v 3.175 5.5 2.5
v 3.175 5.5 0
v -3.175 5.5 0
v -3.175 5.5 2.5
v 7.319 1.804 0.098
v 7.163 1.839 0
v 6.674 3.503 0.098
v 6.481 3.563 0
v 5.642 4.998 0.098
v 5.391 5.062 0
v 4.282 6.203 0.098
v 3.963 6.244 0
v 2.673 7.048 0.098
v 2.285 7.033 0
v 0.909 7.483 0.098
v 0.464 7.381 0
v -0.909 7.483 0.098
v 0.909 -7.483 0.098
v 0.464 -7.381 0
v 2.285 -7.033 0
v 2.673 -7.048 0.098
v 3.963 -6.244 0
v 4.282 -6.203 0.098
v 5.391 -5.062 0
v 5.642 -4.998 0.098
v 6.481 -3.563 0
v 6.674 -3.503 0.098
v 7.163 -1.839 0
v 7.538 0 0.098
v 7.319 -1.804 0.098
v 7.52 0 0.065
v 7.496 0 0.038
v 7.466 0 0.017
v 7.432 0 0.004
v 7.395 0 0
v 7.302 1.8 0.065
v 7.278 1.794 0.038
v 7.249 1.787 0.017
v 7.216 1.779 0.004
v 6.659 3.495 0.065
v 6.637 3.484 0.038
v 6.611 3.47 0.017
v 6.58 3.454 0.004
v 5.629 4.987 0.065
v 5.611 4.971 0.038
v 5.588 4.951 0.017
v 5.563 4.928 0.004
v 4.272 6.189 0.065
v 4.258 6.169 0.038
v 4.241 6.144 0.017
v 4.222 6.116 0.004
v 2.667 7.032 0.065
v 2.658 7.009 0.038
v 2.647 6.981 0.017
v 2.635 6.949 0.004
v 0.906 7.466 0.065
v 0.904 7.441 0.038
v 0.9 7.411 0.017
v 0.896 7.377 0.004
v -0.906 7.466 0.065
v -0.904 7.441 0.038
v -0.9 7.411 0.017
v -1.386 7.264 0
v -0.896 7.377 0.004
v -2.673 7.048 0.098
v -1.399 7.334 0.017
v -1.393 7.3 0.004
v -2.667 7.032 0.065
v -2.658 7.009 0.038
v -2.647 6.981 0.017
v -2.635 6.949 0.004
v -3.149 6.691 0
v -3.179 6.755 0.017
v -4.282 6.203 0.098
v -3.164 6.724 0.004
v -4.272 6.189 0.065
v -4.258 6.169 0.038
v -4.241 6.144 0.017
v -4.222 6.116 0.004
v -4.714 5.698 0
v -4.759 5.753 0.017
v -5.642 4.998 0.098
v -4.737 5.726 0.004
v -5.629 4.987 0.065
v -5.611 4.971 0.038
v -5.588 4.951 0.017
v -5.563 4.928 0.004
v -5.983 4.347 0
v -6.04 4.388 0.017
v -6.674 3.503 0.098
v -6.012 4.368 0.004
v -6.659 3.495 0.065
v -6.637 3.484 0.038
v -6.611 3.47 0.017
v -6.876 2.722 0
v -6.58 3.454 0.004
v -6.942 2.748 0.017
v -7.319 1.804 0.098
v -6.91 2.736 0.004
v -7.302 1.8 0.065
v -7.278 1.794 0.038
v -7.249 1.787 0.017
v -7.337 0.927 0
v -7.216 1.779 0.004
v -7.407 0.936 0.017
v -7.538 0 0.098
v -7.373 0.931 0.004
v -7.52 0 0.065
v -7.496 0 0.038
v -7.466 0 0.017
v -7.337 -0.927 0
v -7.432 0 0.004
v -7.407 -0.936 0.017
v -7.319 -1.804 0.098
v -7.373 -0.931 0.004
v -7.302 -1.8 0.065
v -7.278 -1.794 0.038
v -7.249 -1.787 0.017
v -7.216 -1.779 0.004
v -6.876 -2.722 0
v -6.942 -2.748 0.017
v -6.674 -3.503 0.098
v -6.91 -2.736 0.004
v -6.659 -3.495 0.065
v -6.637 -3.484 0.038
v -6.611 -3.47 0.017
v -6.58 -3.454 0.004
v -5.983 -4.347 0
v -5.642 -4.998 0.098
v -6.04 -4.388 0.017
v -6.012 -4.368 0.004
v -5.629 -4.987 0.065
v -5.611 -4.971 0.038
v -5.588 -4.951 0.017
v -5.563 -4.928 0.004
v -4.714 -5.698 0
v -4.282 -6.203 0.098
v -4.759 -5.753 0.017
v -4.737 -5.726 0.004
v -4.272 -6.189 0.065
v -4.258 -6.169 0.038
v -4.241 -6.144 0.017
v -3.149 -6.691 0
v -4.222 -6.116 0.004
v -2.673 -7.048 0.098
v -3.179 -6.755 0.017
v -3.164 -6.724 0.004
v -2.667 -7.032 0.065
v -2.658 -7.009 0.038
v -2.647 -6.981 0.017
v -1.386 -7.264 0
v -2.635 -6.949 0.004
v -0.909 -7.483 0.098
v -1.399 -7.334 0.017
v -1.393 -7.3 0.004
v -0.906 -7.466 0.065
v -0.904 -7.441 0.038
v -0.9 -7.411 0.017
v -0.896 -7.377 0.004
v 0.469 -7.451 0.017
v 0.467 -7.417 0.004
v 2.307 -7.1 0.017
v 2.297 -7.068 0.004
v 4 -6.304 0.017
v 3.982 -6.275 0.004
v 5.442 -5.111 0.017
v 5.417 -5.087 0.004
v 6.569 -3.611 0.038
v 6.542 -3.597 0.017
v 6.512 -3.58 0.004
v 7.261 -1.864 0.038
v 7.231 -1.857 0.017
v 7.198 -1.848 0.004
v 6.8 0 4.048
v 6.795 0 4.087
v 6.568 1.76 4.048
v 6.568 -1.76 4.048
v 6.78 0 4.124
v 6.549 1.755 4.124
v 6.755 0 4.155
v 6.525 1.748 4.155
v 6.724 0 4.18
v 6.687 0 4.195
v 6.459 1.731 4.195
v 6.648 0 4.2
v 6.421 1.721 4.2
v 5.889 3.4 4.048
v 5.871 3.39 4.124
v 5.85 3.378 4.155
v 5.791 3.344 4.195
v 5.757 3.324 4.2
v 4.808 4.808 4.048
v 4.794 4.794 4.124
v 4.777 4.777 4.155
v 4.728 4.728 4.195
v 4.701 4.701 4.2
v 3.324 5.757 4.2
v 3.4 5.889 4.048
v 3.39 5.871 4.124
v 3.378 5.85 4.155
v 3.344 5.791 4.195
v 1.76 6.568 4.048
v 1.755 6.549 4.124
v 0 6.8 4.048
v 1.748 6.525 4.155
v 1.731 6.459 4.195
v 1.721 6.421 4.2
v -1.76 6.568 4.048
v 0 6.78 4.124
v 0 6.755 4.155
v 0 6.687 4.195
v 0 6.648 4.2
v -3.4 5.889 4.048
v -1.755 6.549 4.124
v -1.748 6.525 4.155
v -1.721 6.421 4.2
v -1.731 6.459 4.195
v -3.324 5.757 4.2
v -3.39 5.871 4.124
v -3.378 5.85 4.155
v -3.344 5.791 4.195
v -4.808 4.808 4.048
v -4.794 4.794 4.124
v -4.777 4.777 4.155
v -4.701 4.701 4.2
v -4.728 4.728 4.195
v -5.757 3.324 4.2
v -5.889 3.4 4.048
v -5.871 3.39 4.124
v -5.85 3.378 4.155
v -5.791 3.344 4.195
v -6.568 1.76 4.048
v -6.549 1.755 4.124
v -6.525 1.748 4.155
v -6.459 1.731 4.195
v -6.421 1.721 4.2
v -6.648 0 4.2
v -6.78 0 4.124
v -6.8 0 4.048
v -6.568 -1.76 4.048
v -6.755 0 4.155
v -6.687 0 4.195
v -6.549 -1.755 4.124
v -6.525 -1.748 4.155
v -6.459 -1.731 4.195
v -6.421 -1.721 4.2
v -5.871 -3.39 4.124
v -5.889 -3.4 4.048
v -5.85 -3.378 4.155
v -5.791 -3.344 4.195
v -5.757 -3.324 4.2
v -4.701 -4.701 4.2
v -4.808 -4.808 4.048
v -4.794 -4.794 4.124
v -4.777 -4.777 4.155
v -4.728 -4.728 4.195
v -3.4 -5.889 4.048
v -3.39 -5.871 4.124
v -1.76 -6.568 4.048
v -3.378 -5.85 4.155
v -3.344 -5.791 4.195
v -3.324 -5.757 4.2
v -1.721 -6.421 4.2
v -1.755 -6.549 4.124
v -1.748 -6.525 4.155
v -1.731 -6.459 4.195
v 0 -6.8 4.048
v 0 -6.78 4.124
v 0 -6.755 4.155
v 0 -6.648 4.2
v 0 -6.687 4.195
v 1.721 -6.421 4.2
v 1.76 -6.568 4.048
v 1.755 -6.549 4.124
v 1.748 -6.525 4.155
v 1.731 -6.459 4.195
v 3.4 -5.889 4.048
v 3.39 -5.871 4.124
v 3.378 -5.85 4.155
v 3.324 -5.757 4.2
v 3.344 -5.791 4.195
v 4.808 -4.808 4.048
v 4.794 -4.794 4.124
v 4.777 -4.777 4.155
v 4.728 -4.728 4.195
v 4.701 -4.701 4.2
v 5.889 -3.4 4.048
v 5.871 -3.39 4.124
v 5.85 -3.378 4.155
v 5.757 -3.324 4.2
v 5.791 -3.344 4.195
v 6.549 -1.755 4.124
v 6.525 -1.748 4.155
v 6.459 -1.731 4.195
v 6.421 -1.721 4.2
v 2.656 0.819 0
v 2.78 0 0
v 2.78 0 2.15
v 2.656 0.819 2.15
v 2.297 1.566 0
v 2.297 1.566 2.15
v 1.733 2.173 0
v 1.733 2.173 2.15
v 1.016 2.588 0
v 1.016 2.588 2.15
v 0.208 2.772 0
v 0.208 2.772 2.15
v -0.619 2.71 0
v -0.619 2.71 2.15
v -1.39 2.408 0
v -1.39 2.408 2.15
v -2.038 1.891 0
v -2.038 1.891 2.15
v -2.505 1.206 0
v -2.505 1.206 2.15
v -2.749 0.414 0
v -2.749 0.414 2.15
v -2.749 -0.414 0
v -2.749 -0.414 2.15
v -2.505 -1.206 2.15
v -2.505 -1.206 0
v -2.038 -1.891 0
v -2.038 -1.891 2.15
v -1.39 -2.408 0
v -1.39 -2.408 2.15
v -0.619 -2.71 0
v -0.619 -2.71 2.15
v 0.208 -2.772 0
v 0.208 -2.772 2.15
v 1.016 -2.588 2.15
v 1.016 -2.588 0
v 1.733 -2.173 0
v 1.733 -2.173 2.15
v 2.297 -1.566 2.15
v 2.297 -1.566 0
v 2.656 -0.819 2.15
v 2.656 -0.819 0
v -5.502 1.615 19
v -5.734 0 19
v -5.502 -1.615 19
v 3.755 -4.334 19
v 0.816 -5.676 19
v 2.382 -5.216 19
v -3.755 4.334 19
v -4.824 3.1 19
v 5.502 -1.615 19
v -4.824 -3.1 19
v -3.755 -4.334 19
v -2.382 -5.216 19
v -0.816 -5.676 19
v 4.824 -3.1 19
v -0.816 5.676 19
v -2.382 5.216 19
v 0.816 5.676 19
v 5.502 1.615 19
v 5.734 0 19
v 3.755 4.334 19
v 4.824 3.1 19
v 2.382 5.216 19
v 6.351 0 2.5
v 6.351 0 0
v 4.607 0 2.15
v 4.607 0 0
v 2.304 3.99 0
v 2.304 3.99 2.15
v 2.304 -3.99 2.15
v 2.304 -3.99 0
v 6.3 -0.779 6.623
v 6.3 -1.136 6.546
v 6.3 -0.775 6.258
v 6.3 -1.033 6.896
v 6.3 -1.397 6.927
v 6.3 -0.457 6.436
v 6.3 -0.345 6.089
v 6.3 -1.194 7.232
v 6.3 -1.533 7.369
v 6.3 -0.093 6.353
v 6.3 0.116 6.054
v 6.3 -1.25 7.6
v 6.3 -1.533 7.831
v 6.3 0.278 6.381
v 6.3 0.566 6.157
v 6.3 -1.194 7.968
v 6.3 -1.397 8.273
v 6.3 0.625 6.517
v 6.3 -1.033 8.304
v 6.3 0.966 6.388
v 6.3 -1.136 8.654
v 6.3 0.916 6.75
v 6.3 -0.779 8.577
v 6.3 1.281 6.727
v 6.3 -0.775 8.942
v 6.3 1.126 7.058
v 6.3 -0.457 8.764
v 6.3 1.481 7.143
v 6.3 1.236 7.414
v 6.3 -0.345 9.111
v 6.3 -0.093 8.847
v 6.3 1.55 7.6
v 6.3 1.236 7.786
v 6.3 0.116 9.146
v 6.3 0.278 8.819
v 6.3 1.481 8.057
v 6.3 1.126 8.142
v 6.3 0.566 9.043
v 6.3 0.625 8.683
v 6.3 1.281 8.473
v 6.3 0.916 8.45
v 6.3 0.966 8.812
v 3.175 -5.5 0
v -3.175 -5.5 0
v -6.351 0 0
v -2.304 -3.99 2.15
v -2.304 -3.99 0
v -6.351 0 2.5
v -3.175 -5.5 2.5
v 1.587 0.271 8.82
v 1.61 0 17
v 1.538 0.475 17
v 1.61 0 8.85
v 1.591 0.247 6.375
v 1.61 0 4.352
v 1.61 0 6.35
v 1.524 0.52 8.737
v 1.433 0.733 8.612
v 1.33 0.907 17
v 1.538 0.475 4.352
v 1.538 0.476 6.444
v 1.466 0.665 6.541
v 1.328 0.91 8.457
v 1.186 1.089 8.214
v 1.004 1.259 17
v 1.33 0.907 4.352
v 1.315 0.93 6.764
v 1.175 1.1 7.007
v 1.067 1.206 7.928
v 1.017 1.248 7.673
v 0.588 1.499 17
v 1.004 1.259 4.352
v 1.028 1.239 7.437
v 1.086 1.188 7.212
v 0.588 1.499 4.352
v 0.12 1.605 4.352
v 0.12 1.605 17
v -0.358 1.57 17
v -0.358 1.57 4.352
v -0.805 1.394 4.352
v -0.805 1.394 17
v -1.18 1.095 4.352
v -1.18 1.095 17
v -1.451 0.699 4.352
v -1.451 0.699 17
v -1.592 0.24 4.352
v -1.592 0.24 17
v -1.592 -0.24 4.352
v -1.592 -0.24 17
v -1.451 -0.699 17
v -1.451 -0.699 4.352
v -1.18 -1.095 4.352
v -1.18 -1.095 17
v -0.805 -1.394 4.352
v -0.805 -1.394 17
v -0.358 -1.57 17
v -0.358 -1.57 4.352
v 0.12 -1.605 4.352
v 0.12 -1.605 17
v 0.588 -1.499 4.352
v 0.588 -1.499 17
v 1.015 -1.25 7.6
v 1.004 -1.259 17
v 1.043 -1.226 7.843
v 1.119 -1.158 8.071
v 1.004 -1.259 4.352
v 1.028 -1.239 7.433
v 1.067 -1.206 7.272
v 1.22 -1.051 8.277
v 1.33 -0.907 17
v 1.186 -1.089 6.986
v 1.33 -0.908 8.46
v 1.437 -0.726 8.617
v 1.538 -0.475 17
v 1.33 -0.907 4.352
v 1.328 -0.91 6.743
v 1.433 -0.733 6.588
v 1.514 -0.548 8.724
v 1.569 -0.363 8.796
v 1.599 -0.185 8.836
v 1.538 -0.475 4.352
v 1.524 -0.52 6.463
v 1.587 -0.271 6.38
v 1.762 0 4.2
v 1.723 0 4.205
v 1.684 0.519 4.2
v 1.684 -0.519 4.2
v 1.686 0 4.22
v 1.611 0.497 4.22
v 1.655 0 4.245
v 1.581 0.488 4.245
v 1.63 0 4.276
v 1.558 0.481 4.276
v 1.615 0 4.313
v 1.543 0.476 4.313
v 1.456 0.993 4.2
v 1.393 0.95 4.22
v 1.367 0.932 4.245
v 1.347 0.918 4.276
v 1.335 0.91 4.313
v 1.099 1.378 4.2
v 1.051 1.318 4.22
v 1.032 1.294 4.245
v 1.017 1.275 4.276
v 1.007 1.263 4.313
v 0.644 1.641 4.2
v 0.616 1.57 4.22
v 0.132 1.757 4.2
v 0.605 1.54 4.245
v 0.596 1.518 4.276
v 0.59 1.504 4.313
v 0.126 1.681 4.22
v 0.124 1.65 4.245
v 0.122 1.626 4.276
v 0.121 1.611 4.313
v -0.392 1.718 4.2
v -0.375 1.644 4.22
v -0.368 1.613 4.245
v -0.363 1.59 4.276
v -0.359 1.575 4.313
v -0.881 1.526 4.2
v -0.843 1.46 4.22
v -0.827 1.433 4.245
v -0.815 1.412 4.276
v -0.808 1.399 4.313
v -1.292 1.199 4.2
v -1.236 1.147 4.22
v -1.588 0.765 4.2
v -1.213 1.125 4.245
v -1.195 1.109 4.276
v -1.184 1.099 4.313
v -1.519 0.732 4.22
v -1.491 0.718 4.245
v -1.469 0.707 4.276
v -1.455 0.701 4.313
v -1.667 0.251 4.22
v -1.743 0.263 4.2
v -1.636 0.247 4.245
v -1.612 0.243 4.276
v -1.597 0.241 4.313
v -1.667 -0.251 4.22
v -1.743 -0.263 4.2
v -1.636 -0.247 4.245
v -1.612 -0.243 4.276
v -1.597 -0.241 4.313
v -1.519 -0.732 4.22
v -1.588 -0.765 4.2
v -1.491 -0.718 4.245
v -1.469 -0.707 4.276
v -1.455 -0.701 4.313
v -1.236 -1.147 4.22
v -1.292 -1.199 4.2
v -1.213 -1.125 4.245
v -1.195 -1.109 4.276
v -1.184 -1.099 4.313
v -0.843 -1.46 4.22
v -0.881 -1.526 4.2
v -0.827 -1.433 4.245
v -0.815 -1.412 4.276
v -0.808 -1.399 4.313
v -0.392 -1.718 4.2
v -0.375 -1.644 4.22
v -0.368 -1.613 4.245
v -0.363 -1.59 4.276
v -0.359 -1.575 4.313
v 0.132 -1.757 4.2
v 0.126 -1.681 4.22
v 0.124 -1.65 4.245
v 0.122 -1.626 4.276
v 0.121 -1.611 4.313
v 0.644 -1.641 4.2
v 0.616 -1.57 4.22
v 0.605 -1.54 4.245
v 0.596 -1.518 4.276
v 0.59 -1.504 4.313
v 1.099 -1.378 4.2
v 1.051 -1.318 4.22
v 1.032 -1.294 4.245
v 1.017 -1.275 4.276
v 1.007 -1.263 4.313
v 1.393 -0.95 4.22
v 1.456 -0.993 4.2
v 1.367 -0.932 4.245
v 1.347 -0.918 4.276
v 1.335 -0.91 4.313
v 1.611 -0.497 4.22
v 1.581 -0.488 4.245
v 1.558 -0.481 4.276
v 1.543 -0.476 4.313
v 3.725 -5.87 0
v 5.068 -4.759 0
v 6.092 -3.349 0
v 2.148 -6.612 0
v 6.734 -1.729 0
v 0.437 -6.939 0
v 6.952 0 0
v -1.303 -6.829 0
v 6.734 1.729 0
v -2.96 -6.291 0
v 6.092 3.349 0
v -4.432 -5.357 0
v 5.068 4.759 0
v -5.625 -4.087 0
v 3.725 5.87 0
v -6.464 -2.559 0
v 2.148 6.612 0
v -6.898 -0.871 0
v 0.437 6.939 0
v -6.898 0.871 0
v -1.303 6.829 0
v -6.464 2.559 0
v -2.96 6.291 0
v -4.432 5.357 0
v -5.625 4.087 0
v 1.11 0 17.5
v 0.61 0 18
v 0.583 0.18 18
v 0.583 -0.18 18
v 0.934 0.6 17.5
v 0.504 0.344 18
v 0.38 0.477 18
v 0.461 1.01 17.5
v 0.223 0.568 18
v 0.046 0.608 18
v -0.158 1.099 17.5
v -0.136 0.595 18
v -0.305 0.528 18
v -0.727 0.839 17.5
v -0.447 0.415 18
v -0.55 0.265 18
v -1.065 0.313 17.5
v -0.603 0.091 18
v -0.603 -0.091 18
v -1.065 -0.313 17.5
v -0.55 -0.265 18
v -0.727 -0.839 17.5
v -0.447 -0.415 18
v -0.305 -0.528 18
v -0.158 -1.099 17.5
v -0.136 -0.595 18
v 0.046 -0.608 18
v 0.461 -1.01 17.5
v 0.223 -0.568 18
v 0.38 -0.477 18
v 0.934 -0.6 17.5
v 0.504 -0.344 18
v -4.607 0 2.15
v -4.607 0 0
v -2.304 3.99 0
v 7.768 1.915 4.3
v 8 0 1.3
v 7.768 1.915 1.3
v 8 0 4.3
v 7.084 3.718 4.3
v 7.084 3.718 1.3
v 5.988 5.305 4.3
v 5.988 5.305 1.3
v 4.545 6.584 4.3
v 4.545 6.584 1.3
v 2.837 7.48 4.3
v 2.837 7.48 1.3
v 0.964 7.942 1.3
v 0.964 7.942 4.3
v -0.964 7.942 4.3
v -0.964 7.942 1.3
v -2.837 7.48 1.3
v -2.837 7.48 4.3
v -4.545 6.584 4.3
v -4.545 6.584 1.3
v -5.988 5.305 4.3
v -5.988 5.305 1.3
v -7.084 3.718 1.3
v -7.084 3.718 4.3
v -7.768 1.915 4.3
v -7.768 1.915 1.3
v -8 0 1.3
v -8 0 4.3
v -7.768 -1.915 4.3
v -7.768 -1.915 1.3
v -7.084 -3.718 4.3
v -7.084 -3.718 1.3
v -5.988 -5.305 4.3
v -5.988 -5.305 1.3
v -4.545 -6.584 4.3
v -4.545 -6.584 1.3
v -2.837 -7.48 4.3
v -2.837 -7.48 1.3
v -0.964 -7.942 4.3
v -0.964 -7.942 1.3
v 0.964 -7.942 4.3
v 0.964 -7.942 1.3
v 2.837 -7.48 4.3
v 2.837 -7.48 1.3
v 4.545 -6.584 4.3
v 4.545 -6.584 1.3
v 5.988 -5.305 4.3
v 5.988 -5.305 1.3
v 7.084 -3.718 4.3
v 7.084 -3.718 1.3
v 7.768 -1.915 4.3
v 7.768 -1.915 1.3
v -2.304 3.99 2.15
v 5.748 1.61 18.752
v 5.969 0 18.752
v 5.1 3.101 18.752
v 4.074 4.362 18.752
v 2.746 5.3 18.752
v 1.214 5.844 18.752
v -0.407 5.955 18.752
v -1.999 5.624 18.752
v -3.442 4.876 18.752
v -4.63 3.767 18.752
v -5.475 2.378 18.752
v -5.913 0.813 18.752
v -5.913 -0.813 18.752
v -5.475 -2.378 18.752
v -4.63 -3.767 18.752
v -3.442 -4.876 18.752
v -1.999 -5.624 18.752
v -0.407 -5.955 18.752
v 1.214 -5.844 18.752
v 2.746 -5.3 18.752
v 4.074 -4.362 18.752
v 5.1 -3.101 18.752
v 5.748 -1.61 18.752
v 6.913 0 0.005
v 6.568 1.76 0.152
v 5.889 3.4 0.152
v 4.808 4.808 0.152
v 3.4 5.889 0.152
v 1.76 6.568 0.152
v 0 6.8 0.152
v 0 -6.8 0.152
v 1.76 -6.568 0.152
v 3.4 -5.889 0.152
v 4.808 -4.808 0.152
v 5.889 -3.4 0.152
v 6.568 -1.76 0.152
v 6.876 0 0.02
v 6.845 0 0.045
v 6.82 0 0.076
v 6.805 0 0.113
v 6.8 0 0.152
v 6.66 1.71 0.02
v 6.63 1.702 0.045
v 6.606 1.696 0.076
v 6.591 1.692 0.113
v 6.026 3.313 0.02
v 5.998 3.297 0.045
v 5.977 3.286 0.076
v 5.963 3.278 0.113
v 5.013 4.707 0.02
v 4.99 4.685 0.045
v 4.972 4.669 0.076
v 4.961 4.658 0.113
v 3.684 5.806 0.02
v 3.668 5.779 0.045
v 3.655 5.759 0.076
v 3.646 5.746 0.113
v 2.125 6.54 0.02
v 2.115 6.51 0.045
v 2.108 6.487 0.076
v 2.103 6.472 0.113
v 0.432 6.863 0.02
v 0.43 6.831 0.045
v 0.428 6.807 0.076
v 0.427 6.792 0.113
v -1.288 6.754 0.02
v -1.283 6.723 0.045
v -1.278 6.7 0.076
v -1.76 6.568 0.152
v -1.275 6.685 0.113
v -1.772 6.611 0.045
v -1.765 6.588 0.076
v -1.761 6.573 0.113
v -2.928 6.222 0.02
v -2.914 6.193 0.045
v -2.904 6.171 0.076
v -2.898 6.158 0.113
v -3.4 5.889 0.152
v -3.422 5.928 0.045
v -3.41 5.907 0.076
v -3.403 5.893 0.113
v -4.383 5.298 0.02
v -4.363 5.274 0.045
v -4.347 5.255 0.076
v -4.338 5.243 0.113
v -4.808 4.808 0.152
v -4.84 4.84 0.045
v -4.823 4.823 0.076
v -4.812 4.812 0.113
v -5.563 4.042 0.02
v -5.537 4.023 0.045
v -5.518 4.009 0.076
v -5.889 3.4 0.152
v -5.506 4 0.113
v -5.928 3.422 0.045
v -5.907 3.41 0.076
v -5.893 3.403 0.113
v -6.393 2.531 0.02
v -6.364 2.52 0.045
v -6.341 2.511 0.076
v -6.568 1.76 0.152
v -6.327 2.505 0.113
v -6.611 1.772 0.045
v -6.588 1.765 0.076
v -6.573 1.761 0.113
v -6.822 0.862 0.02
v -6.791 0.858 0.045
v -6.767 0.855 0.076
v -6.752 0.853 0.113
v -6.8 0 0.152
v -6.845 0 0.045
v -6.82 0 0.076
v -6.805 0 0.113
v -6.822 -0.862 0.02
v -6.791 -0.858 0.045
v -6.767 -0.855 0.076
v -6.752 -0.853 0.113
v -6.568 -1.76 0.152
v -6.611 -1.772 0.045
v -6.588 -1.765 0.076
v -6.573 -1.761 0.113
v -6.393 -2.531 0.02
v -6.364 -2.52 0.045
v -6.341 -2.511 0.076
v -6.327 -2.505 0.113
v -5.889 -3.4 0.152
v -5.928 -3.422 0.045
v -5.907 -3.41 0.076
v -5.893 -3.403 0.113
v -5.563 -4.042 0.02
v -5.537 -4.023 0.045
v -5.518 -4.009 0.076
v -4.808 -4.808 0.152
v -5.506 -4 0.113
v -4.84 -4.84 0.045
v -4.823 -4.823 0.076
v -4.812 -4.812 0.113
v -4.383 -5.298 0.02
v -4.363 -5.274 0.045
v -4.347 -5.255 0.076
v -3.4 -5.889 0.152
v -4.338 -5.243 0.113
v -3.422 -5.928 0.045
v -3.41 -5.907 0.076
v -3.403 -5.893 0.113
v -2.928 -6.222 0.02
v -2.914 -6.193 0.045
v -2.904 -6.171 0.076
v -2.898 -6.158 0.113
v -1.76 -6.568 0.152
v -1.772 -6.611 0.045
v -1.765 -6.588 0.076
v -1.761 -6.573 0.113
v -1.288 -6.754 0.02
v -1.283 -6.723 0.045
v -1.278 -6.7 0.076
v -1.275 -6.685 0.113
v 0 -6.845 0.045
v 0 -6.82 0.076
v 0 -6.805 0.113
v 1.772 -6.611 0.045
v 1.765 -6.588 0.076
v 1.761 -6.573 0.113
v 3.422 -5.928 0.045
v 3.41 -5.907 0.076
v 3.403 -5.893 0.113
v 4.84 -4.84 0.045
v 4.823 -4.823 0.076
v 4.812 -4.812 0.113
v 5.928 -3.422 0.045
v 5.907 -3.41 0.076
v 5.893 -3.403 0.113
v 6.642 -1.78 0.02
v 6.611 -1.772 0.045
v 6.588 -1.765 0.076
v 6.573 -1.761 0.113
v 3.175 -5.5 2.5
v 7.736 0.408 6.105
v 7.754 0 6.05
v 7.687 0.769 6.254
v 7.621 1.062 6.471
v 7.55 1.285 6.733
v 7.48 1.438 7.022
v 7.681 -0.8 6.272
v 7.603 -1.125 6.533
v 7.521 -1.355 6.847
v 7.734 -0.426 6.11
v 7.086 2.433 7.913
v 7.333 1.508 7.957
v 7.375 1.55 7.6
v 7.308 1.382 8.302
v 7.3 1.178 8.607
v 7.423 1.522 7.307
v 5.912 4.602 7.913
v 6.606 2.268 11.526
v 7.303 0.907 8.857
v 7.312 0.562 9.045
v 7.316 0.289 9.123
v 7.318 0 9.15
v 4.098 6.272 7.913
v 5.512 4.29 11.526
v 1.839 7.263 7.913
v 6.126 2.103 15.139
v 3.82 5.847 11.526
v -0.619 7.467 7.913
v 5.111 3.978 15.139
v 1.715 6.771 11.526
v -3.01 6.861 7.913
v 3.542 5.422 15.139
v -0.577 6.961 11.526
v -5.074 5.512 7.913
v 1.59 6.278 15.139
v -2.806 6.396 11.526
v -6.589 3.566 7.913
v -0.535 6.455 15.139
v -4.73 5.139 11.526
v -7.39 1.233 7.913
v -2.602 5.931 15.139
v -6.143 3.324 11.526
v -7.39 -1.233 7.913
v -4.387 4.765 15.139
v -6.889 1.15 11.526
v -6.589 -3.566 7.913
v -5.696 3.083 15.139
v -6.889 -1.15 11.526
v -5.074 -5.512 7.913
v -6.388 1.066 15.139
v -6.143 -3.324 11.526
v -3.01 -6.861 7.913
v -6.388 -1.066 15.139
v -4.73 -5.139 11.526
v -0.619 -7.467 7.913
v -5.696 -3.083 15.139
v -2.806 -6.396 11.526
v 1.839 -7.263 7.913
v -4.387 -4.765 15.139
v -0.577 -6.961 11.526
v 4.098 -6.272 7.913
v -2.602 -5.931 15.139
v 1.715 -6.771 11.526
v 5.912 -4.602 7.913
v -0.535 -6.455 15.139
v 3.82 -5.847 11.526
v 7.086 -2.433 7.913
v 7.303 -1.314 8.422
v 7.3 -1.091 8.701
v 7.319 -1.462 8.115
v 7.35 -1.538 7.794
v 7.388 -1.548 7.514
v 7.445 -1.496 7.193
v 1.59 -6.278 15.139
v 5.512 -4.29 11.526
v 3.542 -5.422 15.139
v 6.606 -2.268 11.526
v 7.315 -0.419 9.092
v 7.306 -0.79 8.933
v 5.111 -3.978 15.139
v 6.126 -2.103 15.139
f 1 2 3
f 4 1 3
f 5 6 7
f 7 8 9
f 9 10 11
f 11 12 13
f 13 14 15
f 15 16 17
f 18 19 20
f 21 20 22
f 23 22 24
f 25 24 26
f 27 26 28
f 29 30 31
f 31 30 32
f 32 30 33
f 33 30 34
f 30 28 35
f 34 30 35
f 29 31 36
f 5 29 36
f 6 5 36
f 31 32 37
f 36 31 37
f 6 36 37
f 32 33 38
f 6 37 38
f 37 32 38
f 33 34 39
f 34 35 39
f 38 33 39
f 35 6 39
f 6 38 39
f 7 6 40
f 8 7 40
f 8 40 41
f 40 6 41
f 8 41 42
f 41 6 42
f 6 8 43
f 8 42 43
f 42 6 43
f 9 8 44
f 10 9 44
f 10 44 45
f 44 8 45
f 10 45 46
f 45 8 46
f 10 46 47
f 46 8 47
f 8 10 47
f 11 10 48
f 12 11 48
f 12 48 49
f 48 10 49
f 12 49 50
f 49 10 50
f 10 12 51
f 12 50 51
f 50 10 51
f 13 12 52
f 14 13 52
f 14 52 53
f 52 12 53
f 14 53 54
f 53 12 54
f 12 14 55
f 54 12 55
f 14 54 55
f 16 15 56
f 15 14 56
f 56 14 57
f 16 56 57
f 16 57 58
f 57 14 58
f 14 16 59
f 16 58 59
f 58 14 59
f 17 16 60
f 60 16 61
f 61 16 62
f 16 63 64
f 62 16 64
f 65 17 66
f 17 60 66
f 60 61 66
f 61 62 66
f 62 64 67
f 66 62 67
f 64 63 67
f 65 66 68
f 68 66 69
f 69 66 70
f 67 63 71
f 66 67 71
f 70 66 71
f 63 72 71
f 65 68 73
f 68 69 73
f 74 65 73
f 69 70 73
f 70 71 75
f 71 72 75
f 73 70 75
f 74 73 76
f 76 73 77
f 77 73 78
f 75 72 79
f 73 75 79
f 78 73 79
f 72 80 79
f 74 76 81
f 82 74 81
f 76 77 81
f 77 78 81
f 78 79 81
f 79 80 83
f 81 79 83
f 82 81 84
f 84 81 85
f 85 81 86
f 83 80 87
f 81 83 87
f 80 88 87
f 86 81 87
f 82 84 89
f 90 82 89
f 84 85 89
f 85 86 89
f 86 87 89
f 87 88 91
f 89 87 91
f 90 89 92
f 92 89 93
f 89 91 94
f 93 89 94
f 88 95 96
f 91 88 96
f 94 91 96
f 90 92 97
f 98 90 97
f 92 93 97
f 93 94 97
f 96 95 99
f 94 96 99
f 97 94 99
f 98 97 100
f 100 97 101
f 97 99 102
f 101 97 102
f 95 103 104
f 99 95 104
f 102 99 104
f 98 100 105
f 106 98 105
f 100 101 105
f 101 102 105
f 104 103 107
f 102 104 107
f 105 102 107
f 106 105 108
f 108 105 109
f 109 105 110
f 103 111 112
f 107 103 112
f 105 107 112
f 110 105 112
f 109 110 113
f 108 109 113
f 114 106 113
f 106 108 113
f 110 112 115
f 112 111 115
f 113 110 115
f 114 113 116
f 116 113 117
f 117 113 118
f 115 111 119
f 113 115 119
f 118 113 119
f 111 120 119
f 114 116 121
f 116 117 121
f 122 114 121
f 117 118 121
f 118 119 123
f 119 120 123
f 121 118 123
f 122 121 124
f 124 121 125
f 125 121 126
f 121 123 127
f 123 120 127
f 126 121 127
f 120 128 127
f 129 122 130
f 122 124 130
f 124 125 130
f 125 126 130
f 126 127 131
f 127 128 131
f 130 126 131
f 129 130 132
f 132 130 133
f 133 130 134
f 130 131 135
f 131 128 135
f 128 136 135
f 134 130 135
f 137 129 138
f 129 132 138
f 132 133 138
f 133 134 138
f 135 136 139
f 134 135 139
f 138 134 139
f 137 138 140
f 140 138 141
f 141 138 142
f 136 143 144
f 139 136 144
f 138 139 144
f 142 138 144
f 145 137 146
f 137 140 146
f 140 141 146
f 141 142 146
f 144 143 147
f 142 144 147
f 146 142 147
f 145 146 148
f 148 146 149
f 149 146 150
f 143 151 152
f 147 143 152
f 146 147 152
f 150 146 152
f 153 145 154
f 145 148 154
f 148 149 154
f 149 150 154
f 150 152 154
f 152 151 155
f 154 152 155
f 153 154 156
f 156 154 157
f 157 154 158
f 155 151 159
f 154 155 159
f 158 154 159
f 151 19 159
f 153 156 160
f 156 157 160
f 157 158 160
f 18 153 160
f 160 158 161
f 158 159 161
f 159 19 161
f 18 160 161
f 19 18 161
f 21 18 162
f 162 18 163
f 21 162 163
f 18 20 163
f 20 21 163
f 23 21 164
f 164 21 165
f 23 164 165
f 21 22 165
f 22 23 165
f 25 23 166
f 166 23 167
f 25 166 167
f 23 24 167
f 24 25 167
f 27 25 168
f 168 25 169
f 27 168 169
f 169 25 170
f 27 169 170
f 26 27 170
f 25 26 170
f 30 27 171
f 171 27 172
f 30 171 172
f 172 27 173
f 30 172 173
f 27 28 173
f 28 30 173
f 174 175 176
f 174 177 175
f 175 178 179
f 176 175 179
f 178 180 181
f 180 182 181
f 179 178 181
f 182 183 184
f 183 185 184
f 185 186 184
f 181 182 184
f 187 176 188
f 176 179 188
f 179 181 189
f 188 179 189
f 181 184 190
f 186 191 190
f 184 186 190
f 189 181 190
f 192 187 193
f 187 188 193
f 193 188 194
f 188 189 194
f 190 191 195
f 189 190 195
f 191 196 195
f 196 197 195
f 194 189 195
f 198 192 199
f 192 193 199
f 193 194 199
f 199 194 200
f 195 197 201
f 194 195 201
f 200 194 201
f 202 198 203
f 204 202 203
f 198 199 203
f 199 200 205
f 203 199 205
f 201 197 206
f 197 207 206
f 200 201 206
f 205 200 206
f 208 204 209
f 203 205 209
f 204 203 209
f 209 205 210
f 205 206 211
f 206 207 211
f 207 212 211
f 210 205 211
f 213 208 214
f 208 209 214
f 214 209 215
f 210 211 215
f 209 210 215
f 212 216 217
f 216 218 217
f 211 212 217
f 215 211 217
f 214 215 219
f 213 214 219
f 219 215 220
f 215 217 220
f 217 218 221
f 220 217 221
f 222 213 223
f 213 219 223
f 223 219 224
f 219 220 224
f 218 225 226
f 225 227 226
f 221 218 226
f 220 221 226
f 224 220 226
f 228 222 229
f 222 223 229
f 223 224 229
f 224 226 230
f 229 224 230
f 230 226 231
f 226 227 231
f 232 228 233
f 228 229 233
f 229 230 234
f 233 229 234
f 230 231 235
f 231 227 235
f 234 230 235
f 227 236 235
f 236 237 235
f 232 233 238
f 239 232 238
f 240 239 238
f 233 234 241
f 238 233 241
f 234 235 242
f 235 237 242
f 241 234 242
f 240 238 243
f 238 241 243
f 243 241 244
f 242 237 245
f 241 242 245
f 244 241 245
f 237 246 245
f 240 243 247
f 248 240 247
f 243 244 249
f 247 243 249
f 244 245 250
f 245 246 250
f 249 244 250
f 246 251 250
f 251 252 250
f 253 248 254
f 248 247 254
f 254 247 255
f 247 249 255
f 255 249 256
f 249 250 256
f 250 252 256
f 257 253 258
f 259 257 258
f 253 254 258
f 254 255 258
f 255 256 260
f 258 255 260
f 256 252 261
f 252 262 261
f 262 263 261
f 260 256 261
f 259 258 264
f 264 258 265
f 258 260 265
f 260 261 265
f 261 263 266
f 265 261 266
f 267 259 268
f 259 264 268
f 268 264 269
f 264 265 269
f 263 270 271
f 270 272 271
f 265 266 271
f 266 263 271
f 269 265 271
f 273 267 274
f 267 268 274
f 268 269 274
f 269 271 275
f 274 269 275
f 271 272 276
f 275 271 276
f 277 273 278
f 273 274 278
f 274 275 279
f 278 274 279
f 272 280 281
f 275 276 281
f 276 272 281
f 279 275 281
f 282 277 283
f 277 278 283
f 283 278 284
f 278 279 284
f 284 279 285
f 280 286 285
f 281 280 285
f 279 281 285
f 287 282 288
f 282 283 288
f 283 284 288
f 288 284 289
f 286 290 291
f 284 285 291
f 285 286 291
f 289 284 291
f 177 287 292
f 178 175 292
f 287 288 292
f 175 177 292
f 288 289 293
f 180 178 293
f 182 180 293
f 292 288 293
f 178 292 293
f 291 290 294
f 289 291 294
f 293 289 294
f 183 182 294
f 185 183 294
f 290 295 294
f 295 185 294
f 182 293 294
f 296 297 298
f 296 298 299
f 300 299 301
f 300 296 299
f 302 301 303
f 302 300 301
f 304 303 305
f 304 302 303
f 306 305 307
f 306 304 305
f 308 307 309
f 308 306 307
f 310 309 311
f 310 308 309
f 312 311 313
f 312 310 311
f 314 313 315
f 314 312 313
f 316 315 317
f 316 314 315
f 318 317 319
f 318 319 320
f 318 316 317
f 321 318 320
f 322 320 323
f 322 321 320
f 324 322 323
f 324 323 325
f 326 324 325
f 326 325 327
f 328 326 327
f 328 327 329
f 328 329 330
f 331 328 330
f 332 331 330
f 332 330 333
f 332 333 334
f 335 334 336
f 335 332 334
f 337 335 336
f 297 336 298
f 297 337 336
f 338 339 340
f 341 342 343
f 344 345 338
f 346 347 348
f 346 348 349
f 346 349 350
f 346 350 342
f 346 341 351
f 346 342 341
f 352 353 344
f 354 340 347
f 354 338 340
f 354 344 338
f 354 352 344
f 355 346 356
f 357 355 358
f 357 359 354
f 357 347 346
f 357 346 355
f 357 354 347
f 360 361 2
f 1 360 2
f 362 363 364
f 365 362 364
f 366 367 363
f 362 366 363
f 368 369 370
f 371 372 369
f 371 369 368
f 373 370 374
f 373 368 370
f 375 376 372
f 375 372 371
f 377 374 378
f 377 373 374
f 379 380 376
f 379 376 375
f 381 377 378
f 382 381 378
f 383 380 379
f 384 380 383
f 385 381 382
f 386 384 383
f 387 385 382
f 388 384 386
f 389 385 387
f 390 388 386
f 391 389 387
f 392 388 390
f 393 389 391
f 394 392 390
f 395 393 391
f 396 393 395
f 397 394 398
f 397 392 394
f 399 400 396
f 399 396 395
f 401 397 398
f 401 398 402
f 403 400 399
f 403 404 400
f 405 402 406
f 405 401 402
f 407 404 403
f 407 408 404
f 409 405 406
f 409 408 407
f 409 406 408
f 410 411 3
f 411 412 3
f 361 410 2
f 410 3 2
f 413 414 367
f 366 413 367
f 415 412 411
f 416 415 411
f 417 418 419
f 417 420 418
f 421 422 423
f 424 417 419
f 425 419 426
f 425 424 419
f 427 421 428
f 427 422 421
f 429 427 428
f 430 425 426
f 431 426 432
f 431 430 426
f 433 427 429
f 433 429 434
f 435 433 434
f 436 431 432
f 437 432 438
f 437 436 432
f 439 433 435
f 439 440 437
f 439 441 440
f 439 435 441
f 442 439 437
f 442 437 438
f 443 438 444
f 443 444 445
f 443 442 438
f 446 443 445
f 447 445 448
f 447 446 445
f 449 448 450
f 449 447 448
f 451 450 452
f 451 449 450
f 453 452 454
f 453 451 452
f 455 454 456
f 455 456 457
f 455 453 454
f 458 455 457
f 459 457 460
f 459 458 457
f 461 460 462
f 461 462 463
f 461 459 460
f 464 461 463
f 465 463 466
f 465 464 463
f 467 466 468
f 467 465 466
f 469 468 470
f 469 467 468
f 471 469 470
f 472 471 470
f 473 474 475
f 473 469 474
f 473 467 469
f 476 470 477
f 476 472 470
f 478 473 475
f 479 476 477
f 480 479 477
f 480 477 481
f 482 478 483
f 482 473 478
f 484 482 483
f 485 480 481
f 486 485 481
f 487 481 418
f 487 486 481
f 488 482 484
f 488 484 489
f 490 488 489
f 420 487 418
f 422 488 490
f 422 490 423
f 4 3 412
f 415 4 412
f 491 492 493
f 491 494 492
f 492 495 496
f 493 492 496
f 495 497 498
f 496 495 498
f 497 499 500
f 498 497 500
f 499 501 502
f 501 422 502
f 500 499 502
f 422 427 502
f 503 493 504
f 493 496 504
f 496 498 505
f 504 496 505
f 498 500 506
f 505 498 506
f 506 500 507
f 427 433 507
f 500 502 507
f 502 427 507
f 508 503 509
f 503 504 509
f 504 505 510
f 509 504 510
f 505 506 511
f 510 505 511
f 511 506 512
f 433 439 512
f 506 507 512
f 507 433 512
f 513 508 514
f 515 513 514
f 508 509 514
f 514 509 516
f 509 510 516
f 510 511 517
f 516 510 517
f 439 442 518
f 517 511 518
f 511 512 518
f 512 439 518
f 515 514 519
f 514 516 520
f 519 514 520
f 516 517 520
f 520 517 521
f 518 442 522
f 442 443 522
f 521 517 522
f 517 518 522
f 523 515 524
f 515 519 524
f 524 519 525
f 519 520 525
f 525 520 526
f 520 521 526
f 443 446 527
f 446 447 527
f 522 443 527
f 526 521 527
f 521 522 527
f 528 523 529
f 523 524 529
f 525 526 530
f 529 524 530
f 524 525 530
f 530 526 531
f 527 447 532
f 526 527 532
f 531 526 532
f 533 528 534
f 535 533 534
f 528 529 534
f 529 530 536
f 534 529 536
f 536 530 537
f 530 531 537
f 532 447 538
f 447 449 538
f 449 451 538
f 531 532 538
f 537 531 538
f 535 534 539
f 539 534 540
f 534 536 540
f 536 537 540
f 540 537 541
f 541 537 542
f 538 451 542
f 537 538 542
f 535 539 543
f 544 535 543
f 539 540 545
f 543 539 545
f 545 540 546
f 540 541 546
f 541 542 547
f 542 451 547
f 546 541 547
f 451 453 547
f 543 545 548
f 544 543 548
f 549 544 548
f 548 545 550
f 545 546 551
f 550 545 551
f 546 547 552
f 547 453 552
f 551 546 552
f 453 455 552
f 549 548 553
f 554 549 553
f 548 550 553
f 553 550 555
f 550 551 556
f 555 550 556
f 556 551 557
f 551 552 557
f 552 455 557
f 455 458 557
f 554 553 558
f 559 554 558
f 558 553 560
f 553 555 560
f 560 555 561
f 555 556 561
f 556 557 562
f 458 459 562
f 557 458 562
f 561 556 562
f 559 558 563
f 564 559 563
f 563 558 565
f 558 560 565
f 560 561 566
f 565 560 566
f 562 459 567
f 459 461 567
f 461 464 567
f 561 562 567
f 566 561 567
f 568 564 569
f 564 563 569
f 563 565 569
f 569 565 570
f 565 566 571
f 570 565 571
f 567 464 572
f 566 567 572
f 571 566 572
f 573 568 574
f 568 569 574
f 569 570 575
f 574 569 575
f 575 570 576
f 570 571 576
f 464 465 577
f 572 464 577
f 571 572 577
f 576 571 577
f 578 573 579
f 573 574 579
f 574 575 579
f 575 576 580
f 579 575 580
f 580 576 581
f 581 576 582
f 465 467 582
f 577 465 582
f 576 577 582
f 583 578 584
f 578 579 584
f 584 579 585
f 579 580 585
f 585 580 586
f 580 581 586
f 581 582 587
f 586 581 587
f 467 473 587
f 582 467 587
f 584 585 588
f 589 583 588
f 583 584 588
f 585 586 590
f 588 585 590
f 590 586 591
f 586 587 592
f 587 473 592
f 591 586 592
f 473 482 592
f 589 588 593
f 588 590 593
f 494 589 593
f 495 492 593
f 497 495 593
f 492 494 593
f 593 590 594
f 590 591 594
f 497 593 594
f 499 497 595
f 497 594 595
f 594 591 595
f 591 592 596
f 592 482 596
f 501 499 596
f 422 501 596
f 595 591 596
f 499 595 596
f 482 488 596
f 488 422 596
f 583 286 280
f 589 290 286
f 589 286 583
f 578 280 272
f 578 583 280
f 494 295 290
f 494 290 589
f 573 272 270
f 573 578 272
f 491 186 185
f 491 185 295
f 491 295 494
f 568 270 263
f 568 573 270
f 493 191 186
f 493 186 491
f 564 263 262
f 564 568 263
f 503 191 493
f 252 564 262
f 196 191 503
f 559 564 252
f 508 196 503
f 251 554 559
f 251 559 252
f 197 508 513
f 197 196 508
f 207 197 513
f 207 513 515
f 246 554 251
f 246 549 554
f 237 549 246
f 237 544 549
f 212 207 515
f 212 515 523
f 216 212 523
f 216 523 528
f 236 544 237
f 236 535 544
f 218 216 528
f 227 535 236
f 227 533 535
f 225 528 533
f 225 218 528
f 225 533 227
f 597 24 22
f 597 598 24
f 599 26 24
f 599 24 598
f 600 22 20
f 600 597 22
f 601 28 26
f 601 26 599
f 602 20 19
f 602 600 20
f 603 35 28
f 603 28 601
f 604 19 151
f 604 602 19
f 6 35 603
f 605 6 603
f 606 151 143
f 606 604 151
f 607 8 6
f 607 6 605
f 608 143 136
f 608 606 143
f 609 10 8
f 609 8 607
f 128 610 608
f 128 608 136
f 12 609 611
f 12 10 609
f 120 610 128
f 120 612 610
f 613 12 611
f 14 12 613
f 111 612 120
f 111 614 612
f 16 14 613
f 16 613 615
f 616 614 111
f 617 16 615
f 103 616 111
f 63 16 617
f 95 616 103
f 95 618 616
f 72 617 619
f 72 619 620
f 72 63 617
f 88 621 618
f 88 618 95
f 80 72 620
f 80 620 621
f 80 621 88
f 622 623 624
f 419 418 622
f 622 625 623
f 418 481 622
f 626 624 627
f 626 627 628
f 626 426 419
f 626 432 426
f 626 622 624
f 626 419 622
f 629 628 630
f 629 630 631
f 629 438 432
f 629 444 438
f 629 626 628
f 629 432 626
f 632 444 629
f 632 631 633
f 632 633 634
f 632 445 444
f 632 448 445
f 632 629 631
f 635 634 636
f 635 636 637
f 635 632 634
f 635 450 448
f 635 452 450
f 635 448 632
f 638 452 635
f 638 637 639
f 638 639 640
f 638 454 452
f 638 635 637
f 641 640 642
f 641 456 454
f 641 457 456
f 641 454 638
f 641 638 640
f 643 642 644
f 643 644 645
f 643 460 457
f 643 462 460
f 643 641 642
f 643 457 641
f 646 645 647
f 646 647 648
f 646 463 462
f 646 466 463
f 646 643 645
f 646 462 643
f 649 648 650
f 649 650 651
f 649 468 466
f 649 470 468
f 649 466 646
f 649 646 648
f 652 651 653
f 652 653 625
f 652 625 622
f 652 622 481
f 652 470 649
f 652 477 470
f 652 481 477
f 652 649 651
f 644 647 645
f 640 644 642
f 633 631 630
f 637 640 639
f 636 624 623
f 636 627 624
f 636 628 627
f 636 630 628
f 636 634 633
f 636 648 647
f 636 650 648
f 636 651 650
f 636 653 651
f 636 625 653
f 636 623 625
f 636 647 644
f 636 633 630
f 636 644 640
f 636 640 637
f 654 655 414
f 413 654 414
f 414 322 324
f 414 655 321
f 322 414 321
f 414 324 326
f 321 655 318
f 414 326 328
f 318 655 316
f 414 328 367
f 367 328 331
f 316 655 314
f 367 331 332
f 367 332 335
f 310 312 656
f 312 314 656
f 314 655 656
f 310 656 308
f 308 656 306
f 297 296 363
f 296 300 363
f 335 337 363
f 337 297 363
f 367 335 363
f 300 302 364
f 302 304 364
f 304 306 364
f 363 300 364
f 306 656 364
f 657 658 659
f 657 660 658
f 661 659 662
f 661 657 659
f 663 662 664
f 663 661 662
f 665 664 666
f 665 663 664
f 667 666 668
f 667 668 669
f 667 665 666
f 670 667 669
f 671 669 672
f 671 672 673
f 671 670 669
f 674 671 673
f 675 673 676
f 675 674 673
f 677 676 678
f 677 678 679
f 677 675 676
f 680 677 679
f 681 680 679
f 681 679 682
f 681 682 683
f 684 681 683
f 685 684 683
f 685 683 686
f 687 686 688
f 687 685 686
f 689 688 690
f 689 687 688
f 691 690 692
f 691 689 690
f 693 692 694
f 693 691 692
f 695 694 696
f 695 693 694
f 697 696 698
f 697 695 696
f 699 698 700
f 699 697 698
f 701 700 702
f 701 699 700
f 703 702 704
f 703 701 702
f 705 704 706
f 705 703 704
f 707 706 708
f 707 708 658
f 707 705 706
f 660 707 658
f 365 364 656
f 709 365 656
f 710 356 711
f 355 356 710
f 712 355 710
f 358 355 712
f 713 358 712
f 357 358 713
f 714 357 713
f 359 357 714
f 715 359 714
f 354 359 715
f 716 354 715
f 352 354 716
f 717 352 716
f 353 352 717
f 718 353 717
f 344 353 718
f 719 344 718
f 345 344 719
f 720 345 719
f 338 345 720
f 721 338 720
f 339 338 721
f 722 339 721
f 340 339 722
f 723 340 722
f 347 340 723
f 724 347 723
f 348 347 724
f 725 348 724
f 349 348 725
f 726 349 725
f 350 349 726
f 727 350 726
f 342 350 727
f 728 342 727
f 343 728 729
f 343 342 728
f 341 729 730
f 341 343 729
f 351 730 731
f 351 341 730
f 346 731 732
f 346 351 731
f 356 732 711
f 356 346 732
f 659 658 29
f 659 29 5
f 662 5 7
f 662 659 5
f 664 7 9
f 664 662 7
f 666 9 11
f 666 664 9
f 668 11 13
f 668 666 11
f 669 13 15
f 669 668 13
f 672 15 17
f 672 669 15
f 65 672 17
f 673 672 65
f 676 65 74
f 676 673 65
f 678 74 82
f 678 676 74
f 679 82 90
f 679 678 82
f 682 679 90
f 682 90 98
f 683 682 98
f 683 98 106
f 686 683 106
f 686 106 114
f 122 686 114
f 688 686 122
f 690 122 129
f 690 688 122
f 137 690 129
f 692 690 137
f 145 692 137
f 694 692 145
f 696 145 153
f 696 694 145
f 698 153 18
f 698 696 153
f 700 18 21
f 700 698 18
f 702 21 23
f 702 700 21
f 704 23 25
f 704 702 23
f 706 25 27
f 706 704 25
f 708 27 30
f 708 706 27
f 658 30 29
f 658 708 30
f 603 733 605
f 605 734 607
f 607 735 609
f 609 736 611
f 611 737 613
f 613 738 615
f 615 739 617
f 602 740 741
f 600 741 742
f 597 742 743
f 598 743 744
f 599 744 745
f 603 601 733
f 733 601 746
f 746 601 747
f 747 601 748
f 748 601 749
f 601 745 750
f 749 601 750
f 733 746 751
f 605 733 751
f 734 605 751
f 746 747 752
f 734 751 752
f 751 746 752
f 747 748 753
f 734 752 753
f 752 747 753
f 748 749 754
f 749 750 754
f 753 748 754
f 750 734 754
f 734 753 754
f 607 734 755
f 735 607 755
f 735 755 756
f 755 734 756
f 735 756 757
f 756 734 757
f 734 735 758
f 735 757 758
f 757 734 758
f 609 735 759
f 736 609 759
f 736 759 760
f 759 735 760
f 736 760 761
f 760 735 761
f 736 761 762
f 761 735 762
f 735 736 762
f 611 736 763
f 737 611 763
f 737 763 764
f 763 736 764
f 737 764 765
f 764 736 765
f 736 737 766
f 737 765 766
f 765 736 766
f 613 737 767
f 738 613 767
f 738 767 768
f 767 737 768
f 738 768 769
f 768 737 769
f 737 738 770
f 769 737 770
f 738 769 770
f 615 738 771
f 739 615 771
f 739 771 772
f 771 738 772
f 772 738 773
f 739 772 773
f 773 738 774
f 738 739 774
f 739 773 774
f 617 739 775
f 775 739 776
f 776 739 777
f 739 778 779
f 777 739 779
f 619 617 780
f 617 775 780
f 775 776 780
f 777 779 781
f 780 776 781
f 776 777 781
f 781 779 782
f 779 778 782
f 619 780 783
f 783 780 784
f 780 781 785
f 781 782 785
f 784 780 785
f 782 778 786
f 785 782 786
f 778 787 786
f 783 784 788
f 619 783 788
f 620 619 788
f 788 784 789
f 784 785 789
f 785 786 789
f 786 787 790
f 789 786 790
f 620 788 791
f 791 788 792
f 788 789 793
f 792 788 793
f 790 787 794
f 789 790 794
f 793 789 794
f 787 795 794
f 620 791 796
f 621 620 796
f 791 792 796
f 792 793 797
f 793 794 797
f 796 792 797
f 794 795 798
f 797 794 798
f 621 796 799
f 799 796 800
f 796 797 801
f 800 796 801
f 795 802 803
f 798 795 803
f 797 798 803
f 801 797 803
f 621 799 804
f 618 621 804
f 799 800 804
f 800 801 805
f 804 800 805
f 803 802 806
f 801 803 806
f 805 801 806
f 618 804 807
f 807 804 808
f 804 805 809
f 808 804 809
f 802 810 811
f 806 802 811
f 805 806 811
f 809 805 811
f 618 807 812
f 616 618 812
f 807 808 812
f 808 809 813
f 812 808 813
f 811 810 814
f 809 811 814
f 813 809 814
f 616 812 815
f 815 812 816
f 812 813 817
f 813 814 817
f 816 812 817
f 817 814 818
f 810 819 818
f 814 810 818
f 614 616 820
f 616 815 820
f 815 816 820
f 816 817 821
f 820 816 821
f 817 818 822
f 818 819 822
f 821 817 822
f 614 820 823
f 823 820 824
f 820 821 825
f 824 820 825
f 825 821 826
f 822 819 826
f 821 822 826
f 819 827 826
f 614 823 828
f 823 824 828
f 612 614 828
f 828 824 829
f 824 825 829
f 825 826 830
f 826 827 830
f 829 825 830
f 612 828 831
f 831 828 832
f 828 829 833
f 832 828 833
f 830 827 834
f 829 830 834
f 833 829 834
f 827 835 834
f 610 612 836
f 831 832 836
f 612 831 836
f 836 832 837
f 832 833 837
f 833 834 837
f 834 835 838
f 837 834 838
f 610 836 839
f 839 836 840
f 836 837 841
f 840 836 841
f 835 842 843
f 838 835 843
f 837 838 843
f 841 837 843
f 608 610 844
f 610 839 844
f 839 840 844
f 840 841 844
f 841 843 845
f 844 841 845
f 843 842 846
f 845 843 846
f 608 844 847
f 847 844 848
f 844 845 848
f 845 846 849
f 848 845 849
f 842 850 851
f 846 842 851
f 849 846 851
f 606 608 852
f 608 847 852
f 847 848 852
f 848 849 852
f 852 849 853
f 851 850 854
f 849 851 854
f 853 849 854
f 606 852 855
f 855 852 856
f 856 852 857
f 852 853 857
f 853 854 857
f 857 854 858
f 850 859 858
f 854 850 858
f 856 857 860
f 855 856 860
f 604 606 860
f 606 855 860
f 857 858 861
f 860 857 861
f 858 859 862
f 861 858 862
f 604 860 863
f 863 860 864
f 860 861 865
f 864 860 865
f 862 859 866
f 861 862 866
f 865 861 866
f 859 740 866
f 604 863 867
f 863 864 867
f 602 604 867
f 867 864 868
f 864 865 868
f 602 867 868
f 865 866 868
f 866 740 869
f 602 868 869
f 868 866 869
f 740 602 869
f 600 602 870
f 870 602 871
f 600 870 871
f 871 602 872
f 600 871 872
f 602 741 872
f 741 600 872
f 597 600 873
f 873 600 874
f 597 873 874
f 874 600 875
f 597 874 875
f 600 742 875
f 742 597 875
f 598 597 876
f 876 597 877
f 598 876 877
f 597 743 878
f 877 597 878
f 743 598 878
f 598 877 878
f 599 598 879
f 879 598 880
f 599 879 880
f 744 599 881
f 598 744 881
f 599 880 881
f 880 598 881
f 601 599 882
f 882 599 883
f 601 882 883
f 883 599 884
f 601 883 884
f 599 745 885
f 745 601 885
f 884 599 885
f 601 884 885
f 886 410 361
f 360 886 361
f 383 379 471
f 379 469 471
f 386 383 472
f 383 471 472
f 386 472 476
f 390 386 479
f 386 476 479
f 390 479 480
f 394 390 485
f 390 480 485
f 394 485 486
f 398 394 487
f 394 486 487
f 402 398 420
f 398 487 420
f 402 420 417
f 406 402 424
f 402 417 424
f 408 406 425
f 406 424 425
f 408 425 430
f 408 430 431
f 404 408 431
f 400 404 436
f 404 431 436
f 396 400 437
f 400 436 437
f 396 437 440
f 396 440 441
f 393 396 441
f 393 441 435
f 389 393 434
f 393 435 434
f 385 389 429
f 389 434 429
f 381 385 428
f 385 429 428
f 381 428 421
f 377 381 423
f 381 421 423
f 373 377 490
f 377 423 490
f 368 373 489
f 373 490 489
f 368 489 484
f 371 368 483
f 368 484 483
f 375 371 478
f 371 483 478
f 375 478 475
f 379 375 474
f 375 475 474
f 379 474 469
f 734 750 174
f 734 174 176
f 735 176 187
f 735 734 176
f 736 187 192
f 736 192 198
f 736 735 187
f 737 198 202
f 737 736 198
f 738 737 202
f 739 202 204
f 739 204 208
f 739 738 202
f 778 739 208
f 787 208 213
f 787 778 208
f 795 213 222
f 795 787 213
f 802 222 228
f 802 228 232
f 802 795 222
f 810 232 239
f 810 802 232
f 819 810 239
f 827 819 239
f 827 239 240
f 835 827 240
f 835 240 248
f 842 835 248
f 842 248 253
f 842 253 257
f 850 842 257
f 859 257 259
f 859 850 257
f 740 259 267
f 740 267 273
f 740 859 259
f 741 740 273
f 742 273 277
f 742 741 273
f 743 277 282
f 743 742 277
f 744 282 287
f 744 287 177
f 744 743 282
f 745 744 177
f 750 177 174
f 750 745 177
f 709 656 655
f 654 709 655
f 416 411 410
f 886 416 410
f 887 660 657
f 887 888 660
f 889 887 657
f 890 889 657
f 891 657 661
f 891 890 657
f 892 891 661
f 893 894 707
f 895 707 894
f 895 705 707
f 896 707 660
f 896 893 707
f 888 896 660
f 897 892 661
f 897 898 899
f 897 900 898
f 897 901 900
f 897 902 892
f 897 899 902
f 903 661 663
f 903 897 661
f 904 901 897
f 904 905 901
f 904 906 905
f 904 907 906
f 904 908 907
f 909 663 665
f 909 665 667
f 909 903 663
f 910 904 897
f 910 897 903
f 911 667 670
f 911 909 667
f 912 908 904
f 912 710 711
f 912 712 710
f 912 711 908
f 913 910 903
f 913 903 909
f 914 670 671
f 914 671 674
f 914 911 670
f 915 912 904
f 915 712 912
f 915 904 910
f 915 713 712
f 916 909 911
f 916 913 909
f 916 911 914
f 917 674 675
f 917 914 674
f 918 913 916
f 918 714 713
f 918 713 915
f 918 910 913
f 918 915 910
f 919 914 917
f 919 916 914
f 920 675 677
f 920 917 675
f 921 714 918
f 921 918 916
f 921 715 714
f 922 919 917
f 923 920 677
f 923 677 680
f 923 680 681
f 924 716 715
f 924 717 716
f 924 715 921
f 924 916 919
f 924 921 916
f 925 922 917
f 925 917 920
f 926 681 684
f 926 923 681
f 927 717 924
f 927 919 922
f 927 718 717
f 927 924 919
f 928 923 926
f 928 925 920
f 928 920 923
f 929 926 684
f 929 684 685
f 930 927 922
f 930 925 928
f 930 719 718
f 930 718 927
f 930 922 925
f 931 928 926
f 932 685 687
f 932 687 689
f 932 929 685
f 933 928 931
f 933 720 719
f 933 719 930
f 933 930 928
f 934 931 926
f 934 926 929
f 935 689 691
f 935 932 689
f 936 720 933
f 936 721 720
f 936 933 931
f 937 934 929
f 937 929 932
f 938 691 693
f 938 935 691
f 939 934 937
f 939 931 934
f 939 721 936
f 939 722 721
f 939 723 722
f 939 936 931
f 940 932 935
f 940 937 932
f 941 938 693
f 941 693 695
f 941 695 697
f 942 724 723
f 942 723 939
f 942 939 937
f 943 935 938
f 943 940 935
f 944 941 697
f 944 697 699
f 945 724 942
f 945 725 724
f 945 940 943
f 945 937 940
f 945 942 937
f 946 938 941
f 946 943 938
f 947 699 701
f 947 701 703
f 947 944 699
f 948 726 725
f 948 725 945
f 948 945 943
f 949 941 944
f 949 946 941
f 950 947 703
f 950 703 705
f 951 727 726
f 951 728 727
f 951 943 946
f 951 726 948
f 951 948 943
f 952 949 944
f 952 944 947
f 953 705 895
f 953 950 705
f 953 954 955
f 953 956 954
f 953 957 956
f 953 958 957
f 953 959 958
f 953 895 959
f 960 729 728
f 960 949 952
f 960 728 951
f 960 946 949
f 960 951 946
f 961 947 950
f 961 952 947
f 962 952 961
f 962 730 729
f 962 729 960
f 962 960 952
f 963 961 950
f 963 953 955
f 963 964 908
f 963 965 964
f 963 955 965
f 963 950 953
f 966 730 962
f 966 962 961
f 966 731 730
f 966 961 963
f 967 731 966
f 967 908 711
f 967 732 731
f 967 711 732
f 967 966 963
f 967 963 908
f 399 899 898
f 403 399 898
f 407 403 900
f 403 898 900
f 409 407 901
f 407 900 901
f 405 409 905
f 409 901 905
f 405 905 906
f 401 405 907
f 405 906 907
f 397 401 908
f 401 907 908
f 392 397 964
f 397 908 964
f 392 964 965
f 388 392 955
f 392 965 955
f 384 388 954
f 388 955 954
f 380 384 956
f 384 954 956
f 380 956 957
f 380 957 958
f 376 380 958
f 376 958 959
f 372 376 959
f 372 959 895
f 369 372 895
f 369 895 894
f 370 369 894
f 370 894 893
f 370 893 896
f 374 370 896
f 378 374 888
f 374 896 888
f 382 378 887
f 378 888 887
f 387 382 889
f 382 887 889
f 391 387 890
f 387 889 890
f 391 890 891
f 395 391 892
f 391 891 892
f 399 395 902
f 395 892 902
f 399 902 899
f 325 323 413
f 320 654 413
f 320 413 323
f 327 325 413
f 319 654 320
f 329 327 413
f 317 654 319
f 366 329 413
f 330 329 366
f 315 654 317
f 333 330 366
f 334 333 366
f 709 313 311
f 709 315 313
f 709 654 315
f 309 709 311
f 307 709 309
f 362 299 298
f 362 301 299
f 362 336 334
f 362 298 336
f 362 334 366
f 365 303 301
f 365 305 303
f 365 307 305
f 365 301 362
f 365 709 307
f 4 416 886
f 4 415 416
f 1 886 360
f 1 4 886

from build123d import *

# Parameters (mm, degrees)
F3_SIZE        = 1
F4_SIZE2       = 0.2
F4_SIZE        = 0.25
F5_R           = 0.1524
F8_D           = 2.5
F8_DEPTH       = 8
F8_START       = 0.6998646
F8_CBORE_D     = 3.1
F8_CBORE_DEPTH = 1
F8_TIP         = 0.7510757738
F9_R           = 2.78
F10_DEPTH      = 2.15
F12_DEPTH      = 2.5


with BuildPart() as f2:
    # F1 (on Front) → F2 (revolve)
    with BuildSketch(Plane.XZ):
        Polygon((6.8, 4.2), (6.8, 0), (7.5, 0), (8, 1.3), (8, 4.3), (5.9340497299, 19), (0, 19), (0, 18), (1.61, 18), (1.61, 4.2), align=None)
    revolve(axis=Axis((0, 0, 11.6), (0, 0, 1)))

    # F3
    f3_edges = [f2.edges().sort_by_distance(p)[0] for p in [
        (-1.61, 0, 18),
    ]]
    chamfer(f3_edges, length=F3_SIZE)

    # F4
    f4_edges = [f2.edges().sort_by_distance(p)[0] for p in [
        (-5.93405, 0, 19),
    ]]
    chamfer(f4_edges, length=F4_SIZE, length2=F4_SIZE2)

    # F5
    f5_edges = [f2.edges().sort_by_distance(p)[0] for p in [
        (-6.8, 0, 0),
        (-7.5, 0, 0),
        (-6.8, 0, 4.2),
        (-1.61, 0, 4.2),
    ]]
    fillet(f5_edges, radius=F5_R)

    # F8
    # its depths count from where the whole tool has entered the part; down to there all is cleared
    with Locations(Plane.YZ.offset(8).offset(-F8_START)):
        with Locations((0, 7.6)):
            CounterBoreHole(F8_D / 2, F8_CBORE_D / 2, F8_CBORE_DEPTH, depth=F8_DEPTH)
            with Locations((0, 0, -(F8_DEPTH + F8_TIP / 2))):  # 118° drill point
                Cone(0, F8_D / 2, F8_TIP, mode=Mode.SUBTRACT)


with BuildPart() as f10:
    # F9 (on Top) → F10 (new body)
    with BuildSketch(Plane.XY):
        Polygon((-2.3036275741, -3.99), (2.3036275741, -3.99), (4.6072551481, 0), (2.3036275741, 3.99), (-2.3036275741, 3.99), (-4.6072551481, 0), align=None)
        Circle(F9_R, mode=Mode.SUBTRACT)
    extrude(amount=F10_DEPTH)


with BuildPart() as f12:
    # F11 (on Top) → F12 (new body)
    with BuildSketch(Plane.XY):
        Polygon((-3.1754264805, -5.5), (3.1754264805, -5.5), (6.3508529611, 0), (3.1754264805, 5.5), (-3.1754264805, 5.5), (-6.3508529611, 0), align=None)
    extrude(amount=F12_DEPTH)


solid = Compound([f2.part, f10.part, f12.part])
